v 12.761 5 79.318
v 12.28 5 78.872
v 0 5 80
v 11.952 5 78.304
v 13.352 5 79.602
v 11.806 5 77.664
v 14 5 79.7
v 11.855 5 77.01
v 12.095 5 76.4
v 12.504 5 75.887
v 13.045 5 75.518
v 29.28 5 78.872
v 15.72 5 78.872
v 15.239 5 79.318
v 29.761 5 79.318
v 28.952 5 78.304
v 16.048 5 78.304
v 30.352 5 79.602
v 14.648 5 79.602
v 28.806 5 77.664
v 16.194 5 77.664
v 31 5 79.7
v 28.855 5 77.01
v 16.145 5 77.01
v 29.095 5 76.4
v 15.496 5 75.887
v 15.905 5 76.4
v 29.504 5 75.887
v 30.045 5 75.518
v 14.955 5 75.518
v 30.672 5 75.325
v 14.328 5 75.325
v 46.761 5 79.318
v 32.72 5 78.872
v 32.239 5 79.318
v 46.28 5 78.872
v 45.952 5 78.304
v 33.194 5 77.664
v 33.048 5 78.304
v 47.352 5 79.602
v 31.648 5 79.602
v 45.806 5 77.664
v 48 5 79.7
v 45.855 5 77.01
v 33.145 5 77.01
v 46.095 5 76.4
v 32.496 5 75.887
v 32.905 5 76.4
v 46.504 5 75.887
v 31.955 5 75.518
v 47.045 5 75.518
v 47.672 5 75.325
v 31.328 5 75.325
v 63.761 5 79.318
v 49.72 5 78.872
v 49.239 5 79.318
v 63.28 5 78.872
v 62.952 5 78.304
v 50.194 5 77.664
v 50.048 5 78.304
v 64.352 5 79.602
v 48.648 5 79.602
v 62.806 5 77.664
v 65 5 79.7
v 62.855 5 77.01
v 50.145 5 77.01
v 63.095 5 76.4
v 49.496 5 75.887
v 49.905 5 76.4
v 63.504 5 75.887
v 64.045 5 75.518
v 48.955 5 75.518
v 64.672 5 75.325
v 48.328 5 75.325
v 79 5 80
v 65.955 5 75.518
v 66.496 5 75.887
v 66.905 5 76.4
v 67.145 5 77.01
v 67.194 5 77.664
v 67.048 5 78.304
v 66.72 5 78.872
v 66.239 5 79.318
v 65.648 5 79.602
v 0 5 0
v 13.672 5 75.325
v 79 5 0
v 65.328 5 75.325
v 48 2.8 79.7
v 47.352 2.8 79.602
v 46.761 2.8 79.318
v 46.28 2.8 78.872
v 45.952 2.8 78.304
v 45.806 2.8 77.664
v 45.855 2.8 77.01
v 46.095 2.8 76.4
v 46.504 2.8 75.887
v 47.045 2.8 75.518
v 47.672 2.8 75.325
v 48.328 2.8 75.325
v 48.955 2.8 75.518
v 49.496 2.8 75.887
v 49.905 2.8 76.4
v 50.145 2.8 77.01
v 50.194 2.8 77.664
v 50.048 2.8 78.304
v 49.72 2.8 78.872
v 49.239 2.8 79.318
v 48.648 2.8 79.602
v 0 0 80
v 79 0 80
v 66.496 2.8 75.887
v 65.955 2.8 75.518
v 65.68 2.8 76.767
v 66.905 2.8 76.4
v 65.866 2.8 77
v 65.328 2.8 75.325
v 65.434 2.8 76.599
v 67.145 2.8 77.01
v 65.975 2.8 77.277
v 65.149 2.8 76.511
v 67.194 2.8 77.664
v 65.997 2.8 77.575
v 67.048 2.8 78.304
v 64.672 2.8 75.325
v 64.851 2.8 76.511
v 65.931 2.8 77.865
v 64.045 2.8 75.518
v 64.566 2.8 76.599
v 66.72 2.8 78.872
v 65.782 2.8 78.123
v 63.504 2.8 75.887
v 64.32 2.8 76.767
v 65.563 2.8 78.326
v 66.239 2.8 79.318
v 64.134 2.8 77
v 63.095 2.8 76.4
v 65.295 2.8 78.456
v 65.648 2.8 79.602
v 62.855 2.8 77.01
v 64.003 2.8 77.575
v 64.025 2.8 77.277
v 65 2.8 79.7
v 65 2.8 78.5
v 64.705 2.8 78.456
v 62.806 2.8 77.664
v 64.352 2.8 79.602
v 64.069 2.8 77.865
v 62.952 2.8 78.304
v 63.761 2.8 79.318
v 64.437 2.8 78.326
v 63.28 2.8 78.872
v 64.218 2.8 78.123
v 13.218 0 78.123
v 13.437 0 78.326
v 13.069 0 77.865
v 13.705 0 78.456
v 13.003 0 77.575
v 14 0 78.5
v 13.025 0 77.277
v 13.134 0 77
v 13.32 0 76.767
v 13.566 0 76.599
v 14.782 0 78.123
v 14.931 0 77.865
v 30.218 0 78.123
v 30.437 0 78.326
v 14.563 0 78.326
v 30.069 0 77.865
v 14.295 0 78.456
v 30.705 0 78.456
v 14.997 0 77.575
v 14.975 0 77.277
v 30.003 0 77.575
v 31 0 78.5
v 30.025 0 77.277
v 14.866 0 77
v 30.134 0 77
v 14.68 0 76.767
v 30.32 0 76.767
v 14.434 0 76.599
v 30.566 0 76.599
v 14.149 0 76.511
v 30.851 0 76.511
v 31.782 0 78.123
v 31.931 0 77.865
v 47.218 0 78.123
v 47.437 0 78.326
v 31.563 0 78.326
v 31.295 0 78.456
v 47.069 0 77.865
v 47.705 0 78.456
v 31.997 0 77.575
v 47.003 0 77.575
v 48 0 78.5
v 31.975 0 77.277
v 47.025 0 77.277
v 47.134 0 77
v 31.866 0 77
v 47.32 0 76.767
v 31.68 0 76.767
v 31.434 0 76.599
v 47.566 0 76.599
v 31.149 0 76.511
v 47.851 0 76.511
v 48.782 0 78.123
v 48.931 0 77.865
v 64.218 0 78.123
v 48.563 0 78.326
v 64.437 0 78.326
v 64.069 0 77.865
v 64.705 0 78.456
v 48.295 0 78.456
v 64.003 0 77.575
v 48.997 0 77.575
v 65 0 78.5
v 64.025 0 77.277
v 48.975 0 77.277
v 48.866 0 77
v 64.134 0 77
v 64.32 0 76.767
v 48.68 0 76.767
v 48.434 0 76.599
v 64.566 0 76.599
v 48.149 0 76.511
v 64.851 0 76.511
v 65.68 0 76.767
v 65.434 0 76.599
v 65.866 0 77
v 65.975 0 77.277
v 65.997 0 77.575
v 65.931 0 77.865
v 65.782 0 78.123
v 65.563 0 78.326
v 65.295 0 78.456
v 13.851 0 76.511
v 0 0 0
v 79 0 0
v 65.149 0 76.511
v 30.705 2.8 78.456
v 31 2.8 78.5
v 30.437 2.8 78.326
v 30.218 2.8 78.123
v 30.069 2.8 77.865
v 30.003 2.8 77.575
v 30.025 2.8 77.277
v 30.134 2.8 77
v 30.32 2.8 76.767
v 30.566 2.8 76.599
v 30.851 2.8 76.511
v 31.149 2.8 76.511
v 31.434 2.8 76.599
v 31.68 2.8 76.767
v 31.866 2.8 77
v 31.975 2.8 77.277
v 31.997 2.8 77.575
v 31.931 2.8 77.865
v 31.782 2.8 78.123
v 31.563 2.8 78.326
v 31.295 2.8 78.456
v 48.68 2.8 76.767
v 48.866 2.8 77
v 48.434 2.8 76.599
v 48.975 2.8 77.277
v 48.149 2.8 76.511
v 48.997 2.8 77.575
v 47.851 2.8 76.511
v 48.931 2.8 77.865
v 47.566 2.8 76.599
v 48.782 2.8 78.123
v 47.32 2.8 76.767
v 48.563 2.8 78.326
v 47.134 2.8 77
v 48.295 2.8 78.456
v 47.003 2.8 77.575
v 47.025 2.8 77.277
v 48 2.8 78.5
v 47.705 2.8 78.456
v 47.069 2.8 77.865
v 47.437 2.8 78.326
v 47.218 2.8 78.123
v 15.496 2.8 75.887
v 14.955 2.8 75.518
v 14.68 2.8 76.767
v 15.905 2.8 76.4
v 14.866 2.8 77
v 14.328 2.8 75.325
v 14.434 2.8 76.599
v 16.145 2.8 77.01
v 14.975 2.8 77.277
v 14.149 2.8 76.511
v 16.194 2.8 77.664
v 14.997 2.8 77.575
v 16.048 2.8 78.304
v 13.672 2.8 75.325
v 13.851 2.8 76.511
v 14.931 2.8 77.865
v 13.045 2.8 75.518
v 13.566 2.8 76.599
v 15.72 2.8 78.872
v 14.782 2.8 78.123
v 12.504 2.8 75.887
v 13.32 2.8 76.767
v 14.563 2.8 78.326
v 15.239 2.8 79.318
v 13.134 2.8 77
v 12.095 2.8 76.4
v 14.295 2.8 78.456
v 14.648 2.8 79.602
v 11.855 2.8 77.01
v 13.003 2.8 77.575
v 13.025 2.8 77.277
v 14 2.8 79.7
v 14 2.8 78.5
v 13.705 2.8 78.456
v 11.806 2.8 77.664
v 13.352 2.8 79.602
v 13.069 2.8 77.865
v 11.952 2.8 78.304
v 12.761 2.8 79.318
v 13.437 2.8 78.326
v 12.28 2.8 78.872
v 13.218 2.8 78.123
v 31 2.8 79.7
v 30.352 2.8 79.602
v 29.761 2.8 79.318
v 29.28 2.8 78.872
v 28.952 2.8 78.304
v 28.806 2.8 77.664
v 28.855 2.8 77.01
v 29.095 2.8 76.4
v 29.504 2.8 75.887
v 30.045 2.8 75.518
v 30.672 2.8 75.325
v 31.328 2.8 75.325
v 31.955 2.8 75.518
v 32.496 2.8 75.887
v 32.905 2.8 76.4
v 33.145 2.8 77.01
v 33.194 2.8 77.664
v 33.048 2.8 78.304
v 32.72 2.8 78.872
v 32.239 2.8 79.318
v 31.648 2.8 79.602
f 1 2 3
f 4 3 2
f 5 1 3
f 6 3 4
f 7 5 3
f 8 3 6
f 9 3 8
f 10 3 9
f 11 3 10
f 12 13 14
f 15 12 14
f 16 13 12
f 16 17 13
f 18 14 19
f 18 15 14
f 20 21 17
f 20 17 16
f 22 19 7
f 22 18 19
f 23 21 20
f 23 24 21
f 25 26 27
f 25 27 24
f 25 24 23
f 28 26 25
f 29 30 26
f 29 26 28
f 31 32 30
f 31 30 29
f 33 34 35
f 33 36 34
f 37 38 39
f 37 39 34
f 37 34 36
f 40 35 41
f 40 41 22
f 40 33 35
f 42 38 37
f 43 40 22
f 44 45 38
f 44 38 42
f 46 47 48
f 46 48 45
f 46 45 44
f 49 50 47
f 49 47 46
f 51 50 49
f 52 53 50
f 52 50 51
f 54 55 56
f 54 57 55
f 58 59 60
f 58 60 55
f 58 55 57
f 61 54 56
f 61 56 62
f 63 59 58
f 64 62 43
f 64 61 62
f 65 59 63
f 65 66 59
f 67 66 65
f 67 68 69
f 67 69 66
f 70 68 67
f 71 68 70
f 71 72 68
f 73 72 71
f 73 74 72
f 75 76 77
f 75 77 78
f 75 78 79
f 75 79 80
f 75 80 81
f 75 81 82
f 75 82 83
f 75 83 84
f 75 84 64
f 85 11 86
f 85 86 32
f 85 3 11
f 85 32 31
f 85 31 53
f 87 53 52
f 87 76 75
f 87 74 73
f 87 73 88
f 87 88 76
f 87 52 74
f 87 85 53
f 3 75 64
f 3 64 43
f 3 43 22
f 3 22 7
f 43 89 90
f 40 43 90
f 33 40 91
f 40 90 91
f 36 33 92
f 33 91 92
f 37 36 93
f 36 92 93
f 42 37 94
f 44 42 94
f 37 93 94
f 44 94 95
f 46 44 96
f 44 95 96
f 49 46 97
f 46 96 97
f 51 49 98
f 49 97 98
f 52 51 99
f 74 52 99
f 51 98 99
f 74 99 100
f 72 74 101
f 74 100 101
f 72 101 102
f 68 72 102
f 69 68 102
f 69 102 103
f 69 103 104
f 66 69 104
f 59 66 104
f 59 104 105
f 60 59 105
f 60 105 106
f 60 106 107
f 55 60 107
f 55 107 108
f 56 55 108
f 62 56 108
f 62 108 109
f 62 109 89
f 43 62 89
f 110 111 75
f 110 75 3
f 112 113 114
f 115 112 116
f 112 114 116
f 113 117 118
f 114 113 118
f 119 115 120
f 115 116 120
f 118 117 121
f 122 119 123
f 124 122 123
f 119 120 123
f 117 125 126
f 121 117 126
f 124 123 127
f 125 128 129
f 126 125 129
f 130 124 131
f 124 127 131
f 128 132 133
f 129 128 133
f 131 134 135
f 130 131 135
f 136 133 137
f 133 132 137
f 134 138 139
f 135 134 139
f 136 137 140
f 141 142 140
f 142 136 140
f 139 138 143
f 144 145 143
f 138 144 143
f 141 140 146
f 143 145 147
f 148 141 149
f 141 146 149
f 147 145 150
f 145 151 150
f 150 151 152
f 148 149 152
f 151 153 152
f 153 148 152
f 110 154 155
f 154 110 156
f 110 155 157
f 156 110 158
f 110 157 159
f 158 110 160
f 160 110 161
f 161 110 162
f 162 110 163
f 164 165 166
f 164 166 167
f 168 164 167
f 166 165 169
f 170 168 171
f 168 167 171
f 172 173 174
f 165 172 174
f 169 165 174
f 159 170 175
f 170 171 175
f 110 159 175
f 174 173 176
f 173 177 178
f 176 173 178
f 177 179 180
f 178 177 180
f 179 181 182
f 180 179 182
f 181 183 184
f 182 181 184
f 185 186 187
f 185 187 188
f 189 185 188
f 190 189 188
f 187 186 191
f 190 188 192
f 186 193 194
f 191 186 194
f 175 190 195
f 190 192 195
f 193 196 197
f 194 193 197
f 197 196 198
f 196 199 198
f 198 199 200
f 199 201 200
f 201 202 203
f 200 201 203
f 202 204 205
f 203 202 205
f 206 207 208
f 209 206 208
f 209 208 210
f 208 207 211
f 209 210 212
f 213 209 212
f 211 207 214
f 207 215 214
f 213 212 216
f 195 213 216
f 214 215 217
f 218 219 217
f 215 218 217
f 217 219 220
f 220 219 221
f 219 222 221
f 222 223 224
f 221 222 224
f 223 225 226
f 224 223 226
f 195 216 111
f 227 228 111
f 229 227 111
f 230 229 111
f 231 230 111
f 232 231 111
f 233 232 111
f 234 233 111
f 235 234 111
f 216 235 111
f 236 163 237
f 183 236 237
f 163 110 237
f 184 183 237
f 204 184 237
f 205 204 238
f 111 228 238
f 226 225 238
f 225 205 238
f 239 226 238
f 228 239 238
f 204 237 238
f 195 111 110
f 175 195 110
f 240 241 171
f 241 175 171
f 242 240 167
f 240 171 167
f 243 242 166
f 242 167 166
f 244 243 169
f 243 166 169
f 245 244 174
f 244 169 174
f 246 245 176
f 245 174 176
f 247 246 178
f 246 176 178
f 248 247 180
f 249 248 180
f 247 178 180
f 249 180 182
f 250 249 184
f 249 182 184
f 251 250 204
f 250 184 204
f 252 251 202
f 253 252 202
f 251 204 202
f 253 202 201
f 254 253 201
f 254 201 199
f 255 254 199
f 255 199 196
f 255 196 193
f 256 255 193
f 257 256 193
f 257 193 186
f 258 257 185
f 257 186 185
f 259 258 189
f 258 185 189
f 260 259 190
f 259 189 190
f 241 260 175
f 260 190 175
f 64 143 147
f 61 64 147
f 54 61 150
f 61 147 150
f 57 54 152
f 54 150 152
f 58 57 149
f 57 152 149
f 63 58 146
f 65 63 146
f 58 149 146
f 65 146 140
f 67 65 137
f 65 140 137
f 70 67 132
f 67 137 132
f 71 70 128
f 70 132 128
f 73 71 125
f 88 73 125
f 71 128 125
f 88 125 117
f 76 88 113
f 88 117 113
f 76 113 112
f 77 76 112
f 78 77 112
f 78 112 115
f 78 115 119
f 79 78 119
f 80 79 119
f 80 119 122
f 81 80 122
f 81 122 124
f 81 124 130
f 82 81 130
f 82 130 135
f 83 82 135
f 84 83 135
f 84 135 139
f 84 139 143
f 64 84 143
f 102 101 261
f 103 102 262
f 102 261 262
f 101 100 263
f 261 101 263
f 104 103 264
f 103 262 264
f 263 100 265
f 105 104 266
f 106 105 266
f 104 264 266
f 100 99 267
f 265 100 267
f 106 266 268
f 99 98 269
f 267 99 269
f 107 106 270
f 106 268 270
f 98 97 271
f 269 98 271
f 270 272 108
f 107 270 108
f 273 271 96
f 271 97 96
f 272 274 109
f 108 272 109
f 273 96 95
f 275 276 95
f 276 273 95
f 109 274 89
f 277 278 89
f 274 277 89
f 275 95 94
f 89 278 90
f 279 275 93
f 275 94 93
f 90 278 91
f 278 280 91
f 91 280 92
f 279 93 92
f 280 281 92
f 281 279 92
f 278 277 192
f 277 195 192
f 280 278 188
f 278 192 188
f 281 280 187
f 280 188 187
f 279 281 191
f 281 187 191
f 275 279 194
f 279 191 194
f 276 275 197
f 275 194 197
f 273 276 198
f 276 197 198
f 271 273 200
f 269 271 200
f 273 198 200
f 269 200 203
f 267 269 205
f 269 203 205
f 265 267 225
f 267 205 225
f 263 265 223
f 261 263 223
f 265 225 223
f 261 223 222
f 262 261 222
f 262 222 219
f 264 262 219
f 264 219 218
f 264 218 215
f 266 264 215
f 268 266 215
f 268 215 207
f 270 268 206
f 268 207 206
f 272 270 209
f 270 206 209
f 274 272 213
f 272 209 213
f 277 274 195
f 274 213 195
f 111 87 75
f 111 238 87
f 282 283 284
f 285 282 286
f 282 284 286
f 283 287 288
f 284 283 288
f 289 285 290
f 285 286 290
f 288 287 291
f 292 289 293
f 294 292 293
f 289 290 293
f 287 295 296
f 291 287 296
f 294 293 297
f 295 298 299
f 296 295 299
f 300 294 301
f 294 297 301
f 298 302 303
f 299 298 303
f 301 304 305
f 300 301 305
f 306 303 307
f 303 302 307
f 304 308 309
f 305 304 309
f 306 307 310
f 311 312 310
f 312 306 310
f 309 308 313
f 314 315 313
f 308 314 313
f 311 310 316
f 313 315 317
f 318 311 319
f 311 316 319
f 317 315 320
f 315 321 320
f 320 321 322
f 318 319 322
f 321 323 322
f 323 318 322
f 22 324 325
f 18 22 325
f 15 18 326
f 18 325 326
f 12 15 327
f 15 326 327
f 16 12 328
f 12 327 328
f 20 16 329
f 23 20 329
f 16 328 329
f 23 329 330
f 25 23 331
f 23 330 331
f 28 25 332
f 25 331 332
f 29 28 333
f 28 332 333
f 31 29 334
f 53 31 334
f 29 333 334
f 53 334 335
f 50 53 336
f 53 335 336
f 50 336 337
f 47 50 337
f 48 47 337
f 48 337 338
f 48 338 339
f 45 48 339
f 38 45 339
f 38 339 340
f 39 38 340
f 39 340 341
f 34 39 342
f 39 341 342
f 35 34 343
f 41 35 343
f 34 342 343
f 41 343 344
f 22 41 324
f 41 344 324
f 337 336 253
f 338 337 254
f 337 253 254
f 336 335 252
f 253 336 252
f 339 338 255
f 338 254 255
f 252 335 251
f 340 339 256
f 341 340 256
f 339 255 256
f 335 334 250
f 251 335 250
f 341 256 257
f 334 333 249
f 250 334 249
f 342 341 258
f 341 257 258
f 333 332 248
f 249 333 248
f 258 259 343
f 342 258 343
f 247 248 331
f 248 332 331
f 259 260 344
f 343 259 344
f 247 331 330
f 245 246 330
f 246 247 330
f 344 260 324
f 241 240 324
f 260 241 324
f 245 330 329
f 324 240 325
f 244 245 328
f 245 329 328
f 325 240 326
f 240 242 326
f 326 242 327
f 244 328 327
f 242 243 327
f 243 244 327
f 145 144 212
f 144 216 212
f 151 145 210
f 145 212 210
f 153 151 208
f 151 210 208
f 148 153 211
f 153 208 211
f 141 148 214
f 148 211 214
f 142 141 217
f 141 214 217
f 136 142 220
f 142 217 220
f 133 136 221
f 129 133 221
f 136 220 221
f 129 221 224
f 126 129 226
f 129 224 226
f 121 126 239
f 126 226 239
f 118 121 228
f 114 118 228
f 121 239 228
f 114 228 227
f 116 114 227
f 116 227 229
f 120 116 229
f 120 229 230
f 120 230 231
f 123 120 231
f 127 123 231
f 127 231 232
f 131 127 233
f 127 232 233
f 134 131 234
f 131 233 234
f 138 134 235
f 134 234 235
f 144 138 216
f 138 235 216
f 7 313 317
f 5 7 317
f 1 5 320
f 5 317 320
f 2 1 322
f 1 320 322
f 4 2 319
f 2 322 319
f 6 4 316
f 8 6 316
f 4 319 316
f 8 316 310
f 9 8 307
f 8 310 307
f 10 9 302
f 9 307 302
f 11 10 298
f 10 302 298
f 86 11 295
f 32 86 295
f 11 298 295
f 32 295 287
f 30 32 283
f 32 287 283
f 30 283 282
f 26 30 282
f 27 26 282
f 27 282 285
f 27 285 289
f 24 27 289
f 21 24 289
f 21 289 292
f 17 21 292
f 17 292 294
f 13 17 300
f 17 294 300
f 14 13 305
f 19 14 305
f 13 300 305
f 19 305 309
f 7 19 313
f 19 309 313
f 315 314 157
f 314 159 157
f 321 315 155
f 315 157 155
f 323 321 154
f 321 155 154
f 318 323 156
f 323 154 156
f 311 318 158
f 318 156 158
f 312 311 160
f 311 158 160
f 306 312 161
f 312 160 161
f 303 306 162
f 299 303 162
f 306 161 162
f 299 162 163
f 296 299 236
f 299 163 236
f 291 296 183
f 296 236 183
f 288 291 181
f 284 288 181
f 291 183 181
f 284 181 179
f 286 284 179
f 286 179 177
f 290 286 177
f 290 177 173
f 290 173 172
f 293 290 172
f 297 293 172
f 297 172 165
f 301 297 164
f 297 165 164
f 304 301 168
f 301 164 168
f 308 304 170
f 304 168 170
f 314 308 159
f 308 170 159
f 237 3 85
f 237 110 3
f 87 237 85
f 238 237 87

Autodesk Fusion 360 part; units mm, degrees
sketch "Sketch1" plane through (0, 0, 0) normal (0, 1, 0) x (1, 0, 0)
  line L0 (0, 0) -> (79, 0)
  line L1 (79, 0) -> (79, -80)
  line L2 (79, -80) -> (0, -80)
  line L3 (0, -80) -> (0, 0)
  dimension "d1" = 79
  dimension "d2" = 80
extrude "Extrude1" add sketch "Sketch1" along normal blind 5
sketch "Sketch2" plane through (0, 5, 0) normal (0, 1, 0) x (-1, 0, 0)
  line L0 (0, 80) -> (-79, 80)
  line L1 (-79, 80) -> (-79, 0)
  line L2 (-79, 0) -> (0, 0)
  line L3 (0, 0) -> (0, 80)
  point P0 (-14, 77.5)
  dimension "d5" = 14
  dimension "d6" = 2.5
hole "Hole1" at (14, 5, 77.5) direction (0, -1, 0) diameter 2 end through all counterbore diameter 4.4 counterbore depth 2.2
pattern_linear "R-Pattern1" count 1 spacing 0 along (0, 0, -1) count 4 spacing 17 along (1, 0, 0) of "Hole1"
